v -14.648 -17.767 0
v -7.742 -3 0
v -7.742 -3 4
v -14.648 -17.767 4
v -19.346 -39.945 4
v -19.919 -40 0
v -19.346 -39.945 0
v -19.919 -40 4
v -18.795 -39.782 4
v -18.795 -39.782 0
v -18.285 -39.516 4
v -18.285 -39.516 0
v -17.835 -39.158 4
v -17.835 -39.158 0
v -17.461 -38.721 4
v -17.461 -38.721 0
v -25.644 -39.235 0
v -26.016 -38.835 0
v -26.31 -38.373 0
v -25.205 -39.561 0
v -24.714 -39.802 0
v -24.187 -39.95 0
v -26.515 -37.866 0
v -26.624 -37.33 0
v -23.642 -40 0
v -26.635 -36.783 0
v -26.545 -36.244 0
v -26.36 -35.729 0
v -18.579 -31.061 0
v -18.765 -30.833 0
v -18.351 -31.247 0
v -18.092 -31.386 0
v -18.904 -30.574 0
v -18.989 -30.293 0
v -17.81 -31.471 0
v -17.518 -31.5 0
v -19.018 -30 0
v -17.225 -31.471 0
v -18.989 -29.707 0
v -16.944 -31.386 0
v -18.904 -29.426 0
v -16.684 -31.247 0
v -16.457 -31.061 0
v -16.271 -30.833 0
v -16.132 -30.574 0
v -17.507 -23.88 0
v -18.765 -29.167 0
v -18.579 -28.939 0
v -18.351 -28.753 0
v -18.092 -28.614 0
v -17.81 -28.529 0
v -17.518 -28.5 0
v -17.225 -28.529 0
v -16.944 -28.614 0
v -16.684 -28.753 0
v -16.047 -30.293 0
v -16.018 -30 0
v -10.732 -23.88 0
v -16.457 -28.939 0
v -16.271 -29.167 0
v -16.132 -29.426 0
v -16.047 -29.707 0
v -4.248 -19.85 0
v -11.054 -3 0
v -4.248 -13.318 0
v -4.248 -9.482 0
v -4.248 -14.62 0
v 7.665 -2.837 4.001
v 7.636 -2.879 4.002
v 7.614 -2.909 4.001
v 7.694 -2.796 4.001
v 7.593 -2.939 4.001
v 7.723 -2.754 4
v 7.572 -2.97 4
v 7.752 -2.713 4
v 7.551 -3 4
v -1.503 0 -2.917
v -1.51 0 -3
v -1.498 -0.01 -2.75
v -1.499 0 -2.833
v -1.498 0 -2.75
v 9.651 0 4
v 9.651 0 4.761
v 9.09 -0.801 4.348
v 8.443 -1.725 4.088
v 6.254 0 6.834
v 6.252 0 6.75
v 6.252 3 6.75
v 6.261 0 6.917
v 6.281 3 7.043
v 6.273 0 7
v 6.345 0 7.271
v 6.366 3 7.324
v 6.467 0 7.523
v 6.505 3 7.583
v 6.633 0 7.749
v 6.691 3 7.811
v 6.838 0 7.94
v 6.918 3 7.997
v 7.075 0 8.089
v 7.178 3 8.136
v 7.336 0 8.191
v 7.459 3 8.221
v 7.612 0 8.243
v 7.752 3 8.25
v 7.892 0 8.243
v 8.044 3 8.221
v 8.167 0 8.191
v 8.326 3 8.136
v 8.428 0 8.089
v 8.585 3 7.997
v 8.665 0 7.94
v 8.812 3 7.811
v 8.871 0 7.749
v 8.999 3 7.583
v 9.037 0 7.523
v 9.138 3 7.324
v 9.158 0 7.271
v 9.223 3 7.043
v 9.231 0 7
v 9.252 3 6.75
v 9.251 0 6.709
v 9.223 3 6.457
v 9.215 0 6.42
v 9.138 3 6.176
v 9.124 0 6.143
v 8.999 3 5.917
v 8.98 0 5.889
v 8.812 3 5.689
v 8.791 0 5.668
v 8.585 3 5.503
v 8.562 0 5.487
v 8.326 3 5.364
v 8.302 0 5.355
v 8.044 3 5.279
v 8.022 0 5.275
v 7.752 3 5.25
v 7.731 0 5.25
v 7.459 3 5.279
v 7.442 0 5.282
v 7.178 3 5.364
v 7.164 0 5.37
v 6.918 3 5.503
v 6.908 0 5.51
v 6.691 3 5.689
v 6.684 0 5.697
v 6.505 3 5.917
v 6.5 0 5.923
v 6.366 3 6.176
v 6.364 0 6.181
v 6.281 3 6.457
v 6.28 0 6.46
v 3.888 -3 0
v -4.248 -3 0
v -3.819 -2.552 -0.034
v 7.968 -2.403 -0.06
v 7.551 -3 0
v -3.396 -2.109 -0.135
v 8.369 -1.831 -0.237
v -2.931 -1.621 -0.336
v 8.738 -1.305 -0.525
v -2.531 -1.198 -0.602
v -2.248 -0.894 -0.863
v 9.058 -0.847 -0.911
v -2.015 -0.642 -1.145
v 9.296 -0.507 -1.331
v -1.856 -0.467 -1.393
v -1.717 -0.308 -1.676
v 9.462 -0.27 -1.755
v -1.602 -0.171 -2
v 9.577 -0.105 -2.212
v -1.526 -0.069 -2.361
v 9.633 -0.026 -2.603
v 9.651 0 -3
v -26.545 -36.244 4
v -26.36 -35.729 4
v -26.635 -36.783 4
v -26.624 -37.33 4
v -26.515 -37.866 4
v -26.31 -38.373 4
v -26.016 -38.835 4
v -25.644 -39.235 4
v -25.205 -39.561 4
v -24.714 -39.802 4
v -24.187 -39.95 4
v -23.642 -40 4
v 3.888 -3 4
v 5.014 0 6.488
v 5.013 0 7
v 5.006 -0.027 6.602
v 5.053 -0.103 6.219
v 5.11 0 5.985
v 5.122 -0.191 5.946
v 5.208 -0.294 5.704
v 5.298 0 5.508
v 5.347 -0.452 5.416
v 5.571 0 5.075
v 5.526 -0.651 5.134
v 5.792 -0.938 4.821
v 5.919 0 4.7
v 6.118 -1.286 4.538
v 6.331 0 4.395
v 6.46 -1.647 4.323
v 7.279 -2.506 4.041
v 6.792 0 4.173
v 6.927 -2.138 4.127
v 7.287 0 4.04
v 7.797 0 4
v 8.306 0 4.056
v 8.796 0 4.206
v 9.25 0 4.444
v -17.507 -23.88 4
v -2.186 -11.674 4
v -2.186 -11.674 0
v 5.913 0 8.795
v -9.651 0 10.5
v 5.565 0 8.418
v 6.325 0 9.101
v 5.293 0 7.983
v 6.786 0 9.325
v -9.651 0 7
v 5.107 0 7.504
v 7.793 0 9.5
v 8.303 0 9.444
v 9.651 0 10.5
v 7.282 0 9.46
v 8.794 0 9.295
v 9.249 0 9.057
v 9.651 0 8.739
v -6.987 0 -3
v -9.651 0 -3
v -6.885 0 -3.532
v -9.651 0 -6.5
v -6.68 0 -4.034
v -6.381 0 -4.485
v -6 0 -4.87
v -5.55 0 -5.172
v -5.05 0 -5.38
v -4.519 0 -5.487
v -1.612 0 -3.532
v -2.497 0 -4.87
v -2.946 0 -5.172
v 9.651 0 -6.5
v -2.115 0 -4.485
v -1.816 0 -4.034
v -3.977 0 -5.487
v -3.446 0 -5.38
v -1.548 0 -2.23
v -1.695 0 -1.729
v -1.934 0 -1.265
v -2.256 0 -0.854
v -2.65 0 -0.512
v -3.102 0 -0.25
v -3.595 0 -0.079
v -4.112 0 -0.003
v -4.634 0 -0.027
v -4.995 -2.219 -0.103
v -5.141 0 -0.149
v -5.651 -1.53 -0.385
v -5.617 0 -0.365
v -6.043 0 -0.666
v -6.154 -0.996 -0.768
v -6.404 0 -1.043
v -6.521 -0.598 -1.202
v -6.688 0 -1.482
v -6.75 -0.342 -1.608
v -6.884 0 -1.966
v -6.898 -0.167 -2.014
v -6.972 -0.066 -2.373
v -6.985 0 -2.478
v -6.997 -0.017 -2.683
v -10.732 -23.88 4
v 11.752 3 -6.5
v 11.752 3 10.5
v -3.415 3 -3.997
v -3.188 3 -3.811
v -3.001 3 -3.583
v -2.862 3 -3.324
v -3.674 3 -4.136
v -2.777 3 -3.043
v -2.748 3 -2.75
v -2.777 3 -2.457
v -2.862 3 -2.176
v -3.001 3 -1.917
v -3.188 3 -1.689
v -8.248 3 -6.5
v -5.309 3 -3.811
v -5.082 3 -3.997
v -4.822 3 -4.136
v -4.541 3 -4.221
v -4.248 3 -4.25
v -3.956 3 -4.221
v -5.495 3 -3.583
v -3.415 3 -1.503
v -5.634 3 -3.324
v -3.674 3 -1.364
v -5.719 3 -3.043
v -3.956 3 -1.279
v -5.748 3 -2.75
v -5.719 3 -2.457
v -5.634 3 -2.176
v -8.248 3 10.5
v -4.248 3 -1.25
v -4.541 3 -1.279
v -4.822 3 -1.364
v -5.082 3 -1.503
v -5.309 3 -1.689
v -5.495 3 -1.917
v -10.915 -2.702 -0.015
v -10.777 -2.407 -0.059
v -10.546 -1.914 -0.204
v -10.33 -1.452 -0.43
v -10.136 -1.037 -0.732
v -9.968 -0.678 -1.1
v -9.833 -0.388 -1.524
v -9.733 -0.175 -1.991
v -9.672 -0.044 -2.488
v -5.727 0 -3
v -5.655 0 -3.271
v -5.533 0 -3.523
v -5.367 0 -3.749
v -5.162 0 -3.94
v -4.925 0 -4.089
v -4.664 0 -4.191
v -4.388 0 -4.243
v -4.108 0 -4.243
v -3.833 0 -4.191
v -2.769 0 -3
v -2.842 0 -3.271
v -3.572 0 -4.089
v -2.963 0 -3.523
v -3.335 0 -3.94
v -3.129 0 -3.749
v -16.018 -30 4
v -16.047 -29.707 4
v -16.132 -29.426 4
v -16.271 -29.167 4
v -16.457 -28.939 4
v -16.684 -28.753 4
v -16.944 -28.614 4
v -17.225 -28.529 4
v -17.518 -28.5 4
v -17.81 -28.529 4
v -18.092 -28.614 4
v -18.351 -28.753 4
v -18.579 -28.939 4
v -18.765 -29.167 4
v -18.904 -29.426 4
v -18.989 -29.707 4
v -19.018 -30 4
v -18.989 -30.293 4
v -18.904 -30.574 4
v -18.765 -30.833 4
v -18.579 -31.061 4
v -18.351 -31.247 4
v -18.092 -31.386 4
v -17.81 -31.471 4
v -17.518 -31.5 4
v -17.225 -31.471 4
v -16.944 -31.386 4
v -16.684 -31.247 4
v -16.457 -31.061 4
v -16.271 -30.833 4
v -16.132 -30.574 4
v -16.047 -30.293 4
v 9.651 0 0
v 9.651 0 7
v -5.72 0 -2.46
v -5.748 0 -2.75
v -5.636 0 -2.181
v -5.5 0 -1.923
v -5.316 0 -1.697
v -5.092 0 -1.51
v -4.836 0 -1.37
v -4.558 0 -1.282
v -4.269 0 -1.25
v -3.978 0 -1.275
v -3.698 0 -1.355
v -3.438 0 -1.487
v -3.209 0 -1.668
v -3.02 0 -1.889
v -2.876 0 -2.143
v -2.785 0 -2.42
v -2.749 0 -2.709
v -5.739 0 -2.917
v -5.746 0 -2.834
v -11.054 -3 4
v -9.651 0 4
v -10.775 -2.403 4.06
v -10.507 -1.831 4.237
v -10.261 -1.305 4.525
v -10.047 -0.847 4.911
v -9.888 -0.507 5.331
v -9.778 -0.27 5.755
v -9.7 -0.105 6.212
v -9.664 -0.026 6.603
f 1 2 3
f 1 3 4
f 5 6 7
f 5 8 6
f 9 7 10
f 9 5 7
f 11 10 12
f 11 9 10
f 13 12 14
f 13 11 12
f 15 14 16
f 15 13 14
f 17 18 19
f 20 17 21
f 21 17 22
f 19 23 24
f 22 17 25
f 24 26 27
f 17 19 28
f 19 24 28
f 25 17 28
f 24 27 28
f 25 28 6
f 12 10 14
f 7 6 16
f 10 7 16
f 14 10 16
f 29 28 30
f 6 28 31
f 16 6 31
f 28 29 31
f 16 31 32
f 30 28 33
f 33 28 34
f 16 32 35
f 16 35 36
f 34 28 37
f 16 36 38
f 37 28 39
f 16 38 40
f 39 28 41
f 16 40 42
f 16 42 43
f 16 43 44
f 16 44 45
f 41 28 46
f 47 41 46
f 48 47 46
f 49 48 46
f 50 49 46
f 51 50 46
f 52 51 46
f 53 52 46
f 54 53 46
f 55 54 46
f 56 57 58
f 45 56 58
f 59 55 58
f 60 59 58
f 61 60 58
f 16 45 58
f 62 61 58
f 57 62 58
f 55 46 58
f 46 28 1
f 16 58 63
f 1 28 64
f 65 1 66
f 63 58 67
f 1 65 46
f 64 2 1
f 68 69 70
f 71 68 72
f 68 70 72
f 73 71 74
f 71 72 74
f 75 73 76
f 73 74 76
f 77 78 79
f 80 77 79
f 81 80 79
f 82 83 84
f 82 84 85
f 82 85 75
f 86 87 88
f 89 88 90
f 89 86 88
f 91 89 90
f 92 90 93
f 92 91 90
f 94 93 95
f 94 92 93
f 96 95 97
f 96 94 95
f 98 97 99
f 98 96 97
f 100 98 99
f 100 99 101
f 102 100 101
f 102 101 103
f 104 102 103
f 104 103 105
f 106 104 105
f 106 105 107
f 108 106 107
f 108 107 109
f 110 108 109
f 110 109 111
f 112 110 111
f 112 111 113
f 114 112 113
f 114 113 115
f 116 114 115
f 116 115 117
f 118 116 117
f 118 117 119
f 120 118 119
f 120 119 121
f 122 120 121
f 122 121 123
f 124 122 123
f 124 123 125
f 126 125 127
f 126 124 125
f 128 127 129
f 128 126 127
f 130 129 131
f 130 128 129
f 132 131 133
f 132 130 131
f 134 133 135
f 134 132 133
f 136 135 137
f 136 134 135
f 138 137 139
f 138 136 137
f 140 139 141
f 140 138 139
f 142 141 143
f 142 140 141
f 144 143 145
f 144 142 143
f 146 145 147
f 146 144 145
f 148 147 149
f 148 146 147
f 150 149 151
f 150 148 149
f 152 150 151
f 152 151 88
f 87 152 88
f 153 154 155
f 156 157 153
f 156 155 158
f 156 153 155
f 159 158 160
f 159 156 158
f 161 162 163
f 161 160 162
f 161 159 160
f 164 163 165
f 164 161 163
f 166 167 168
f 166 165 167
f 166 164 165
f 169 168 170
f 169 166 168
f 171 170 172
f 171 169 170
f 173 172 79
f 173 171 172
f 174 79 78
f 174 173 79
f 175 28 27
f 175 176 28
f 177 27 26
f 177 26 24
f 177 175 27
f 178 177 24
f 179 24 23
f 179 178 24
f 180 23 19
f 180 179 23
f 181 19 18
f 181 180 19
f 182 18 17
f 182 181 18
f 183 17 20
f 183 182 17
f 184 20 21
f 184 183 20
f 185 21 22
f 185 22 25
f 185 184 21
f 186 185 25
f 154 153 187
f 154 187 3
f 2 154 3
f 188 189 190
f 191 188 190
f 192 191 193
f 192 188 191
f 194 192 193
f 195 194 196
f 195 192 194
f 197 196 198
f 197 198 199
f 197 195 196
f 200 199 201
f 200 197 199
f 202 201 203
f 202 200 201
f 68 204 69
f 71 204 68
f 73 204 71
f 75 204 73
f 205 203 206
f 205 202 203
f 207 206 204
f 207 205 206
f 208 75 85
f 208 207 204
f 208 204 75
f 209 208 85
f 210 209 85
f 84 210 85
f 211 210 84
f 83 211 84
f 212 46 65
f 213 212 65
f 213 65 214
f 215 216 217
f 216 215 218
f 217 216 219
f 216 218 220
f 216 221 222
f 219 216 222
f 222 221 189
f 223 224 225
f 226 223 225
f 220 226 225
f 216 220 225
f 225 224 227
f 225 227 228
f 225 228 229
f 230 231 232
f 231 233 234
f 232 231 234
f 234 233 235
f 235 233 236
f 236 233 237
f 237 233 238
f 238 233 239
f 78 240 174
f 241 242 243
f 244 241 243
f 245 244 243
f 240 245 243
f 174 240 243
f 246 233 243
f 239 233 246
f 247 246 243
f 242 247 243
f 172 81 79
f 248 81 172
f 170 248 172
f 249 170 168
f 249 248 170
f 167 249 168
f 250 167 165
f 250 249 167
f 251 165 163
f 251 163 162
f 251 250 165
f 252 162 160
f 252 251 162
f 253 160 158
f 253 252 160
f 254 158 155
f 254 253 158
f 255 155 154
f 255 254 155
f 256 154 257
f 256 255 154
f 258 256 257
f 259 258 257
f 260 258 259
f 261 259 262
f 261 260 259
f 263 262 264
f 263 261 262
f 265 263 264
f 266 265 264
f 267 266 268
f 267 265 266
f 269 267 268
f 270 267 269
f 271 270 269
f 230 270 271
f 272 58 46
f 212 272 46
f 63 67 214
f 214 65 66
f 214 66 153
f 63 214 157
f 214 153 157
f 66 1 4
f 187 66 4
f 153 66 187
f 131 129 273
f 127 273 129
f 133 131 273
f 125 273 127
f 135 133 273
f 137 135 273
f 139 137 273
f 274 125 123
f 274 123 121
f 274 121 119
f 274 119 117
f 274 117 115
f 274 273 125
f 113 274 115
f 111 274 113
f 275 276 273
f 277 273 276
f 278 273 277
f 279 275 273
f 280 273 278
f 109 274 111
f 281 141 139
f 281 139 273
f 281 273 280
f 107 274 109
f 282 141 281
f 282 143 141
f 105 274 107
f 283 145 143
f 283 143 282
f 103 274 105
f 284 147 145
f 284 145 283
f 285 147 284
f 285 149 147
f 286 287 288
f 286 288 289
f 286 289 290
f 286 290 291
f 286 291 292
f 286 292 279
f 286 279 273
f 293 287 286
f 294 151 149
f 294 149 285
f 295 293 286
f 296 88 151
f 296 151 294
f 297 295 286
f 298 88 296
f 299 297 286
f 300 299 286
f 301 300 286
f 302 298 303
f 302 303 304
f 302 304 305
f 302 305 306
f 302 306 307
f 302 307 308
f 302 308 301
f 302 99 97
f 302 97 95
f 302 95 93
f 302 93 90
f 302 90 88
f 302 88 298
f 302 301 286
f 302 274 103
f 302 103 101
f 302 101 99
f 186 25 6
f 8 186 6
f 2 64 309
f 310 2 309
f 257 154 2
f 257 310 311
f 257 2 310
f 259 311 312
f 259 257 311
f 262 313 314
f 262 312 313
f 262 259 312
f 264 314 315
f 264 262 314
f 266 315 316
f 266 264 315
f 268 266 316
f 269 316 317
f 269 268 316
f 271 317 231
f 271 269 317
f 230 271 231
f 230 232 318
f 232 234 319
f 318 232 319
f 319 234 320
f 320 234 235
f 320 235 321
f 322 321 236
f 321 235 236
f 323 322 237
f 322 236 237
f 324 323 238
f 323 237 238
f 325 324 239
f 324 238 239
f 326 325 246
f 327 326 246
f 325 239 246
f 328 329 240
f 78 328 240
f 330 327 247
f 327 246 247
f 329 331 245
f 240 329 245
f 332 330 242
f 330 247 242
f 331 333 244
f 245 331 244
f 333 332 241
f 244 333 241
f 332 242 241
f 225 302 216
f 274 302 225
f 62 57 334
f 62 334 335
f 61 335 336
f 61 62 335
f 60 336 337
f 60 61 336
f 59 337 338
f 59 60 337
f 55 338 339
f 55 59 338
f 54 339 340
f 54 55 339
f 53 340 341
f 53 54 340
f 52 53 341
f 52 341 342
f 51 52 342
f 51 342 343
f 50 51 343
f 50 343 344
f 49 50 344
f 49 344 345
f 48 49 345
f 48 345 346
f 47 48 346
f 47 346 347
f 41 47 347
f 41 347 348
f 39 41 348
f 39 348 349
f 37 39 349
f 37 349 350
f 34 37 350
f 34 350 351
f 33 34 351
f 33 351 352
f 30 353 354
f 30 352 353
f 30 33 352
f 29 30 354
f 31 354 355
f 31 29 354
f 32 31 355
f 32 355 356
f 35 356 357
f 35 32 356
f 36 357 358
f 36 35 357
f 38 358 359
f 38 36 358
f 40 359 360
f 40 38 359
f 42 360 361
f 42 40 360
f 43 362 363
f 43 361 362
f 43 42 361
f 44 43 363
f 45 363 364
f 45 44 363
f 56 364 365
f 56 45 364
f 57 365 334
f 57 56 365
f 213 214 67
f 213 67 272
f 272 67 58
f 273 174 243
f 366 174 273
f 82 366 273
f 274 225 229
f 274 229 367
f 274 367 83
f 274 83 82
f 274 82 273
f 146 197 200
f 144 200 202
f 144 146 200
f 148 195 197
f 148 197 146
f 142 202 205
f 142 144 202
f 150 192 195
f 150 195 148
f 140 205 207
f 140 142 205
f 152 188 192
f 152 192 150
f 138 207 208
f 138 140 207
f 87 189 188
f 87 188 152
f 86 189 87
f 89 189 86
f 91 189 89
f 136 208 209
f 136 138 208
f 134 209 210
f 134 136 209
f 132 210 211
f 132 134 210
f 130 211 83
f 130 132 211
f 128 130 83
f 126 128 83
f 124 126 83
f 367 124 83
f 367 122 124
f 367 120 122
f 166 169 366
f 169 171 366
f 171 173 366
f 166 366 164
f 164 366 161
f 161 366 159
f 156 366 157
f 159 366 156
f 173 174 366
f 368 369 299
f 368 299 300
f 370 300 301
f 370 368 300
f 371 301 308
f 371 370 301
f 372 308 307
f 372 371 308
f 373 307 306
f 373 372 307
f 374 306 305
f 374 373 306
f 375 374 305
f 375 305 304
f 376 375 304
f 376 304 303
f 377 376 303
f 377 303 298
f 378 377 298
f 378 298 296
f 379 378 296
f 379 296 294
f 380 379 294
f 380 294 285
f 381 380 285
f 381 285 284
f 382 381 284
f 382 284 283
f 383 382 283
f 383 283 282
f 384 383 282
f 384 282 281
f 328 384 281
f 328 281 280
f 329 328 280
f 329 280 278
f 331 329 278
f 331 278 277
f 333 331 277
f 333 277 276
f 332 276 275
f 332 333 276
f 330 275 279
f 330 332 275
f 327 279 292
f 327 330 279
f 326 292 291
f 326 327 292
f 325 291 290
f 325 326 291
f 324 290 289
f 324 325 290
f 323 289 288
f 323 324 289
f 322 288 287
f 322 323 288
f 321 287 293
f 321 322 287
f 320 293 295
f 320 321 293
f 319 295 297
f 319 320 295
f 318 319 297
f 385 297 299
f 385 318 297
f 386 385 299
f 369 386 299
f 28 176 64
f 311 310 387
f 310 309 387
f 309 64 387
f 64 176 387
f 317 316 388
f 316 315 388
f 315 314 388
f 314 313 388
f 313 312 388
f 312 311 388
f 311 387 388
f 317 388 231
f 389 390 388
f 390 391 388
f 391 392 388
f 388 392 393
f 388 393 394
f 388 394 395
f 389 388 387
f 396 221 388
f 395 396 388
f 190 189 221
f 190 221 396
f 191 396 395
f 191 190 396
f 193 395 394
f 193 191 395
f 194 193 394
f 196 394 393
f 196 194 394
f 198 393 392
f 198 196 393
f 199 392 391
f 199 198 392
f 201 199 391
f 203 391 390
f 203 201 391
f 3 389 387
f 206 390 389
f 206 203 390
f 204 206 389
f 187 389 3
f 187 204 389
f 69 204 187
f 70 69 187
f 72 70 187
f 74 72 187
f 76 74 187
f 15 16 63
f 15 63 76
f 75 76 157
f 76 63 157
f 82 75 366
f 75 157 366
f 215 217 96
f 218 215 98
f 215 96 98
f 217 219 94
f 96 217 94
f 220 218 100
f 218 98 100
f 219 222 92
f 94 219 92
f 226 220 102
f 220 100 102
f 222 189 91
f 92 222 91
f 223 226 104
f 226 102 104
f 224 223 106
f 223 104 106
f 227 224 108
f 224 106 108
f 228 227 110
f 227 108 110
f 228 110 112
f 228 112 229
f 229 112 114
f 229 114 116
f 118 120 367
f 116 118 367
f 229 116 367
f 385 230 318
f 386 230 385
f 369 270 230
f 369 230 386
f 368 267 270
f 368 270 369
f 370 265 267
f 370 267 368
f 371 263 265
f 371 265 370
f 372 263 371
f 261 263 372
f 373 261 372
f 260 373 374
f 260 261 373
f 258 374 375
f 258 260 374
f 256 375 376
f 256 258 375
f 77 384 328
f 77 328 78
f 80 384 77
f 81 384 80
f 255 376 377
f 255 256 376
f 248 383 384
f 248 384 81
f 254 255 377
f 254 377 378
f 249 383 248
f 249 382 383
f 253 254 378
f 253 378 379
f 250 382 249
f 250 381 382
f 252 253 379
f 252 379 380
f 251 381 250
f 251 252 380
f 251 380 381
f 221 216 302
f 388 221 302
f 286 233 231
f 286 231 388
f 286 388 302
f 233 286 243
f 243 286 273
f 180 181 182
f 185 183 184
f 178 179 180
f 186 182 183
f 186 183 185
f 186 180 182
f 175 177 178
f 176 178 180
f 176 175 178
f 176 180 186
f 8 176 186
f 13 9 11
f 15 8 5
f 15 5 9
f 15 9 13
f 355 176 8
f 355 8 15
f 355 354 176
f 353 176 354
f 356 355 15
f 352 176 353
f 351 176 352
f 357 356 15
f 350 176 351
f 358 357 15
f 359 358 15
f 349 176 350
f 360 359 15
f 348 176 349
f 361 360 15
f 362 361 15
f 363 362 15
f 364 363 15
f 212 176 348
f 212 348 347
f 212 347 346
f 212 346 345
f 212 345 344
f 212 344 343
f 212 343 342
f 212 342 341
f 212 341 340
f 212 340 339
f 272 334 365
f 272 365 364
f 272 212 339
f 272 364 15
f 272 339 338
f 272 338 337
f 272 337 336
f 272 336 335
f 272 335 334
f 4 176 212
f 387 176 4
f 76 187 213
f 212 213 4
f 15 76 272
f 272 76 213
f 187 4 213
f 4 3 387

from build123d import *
from build123d.topology import SkipClean

# Parameters (mm, degrees)
BOSS_EXTRUDE1_DEPTH     = 4
SKETCH2_W               = 19.302325582
SKETCH2_H               = 17
BOSS_EXTRUDE2_DEPTH     = 3
CUT_EXTRUDE1_DEPTH      = 52.89534967
CUT_EXTRUDE1_DEPTH_BACK = 52.89534967
BOSS_EXTRUDE3_DEPTH     = 17
FILLET1_R               = 3
CUT_EXTRUDE2_DEPTH      = 50.194156235
CUT_EXTRUDE2_DEPTH_BACK = 50.194156235
SKETCH5_R               = 1.5
CUT_EXTRUDE3_DEPTH      = 52.662994567
CUT_EXTRUDE3_DEPTH_BACK = 52.662994567
SKETCH6_R               = 1.5
FILLET2_R               = 3
SKETCH7_R               = 2.75
CUT_EXTRUDE5_DEPTH      = 50.194156235


with BuildPart() as part:
    # Sketch1 → Boss-Extrude1 (new body)
    with BuildSketch(Plane.XY):
        Polygon((-28.357138738, -40), (-18.357138738, -40), (9.651162791, 0), (-9.651162791, 0), align=None)
    extrude(amount=BOSS_EXTRUDE1_DEPTH)

    # Sketch2 → Boss-Extrude2 (add)
    with BuildSketch(Plane(origin=(0, 0, 0), x_dir=(1, 0, 0), z_dir=(0, 1, 0))):
        with Locations((0, -2)):
            Rectangle(SKETCH2_W, SKETCH2_H)
    extrude(amount=BOSS_EXTRUDE2_DEPTH)

    # Sketch3 → Cut-Extrude1 (cut, two sides: drawn at the far end of the back side and taken through both)
    with BuildSketch(Plane.XY.offset(10.5).offset(-CUT_EXTRUDE1_DEPTH_BACK)):
        Polygon((-9.651162791, 0), (-8.248214595, 3), (-9.651162791, 3), align=None)
    extrude(amount=CUT_EXTRUDE1_DEPTH + CUT_EXTRUDE1_DEPTH_BACK, mode=Mode.SUBTRACT)

    # Sketch4 → Boss-Extrude3 (add, through all)
    with BuildSketch(Plane.XY.offset(10.5)):
        Polygon((9.651162791, 3), (9.651162791, 0), (11.751785405, 3), align=None)
    extrude(amount=-BOSS_EXTRUDE3_DEPTH)

    # Fillet1
    fillet1_edges = [part.edges().sort_by_distance(p)[0] for p in [
        (-18.357138738, -40, 2),
        (-28.357138738, -40, 2),
    ]]
    fillet(fillet1_edges, radius=FILLET1_R)

    # Sketch5 → Cut-Extrude2 (cut, two sides: drawn at the far end of the back side and taken through both)
    with BuildSketch(Plane.XY.offset(4).offset(-CUT_EXTRUDE2_DEPTH_BACK)):
        with Locations((-17.517854053, -30)):
            Circle(SKETCH5_R)
        Polygon((-10.732268808, -23.880216821), (-17.506894929, -23.880216821), (-2.185708769, -11.674464137), align=None)
        Polygon((-14.648109244, -17.767120785), (3.88821641, -3), (-7.742274088, -3), align=None)
    extrude(amount=CUT_EXTRUDE2_DEPTH + CUT_EXTRUDE2_DEPTH_BACK, mode=Mode.SUBTRACT)

    # Sketch6 → Cut-Extrude3 (cut, two sides: drawn at the far end of the back side and taken through both)
    with BuildSketch(Plane(origin=(0, 3, 0), x_dir=(1, 0, 0), z_dir=(0, 1, 0)).offset(-CUT_EXTRUDE3_DEPTH_BACK)):
        with Locations(Location((-4.248214595, 2.75, 0), (0, 0, 180))):
            Circle(SKETCH6_R)
        with Locations(Location((7.751785405, -6.75, 0), (0, 0, 180))):
            Circle(SKETCH6_R)
    extrude(amount=CUT_EXTRUDE3_DEPTH + CUT_EXTRUDE3_DEPTH_BACK, mode=Mode.SUBTRACT)

    # Fillet2
    # the kernel refuses this fillet: 3 mm, written as the material it adds along each edge
    with BuildSketch(Plane(origin=(17.151162791, 0, 0), x_dir=(0, -1, 0), z_dir=(-1, 0, 0))) as fillet2_piece_1_section:
        with BuildLine():
            CenterArc((FILLET2_R, -FILLET2_R), FILLET2_R, 90, 90)
            Line((0, -FILLET2_R), (0, 0))
            Line((0, 0), (FILLET2_R, 0))
        make_face()
    fillet2_piece_1 = extrude(amount=34.302325581, mode=Mode.PRIVATE)
    fillet2_piece_1 = split(fillet2_piece_1, bisect_by=Plane(origin=(8.707650451, -1.347475267, -0.62141613), z_dir=(-0.8191520442889888, 0.5735764363510504, 0)), keep=Keep.TOP, mode=Mode.PRIVATE)
    fillet2_piece_1 = split(fillet2_piece_1, bisect_by=Plane(origin=(-6.80101607, 6.094622871, -0.62141613), z_dir=(0.9058417102512069, -0.42361633109356, 0)), keep=Keep.TOP, mode=Mode.PRIVATE)
    fillet2_piece_1 = fillet2_piece_1 - Plane(origin=(-4.248214595, -0.776972683, -2.75), x_dir=(-1, 0, 0), z_dir=(0, 1, 0)) * Cylinder(1.5, 81, mode=Mode.PRIVATE)
    add(fillet2_piece_1)
    with BuildSketch(Plane(origin=(17.151162791, 0, 4), x_dir=(0, -1, 0), z_dir=(-1, 0, 0))) as fillet2_piece_2_section:
        with BuildLine():
            CenterArc((FILLET2_R, FILLET2_R), FILLET2_R, 180, 90)
            Line((0, FILLET2_R), (0, 0))
            Line((0, 0), (FILLET2_R, 0))
        make_face()
    fillet2_piece_2 = extrude(amount=34.302325581, mode=Mode.PRIVATE)
    fillet2_piece_2 = split(fillet2_piece_2, bisect_by=Plane(origin=(8.664647852, -1.408889344, 4.489642882), z_dir=(-0.8191520442889888, 0.5735764363510504, 0)), keep=Keep.TOP, mode=Mode.PRIVATE)
    fillet2_piece_2 = split(fillet2_piece_2, bisect_by=Plane(origin=(-6.833394213, 6.025386936, 4.489642882), z_dir=(0.9058417102512069, -0.42361633109356, 0)), keep=Keep.TOP, mode=Mode.PRIVATE)
    fillet2_piece_2 = fillet2_piece_2 - Plane(origin=(7.751785405, -0.84697785, 6.75), x_dir=(-1, 0, 0), z_dir=(0, 1, 0)) * Cylinder(1.5, 81, mode=Mode.PRIVATE)
    add(fillet2_piece_2)

    # Sketch7 → Cut-Extrude5 (cut, through all)
    with SkipClean():  # the faces are left unmerged after this step: merging them gives an invalid solid
        with BuildSketch(Plane.XZ):
            with Locations((-4.248214595, -2.75)):
                Circle(SKETCH7_R)
            with Locations((7.751785405, 6.75)):
                Circle(SKETCH7_R)
        extrude(amount=CUT_EXTRUDE5_DEPTH, mode=Mode.SUBTRACT)


solid = part.part
